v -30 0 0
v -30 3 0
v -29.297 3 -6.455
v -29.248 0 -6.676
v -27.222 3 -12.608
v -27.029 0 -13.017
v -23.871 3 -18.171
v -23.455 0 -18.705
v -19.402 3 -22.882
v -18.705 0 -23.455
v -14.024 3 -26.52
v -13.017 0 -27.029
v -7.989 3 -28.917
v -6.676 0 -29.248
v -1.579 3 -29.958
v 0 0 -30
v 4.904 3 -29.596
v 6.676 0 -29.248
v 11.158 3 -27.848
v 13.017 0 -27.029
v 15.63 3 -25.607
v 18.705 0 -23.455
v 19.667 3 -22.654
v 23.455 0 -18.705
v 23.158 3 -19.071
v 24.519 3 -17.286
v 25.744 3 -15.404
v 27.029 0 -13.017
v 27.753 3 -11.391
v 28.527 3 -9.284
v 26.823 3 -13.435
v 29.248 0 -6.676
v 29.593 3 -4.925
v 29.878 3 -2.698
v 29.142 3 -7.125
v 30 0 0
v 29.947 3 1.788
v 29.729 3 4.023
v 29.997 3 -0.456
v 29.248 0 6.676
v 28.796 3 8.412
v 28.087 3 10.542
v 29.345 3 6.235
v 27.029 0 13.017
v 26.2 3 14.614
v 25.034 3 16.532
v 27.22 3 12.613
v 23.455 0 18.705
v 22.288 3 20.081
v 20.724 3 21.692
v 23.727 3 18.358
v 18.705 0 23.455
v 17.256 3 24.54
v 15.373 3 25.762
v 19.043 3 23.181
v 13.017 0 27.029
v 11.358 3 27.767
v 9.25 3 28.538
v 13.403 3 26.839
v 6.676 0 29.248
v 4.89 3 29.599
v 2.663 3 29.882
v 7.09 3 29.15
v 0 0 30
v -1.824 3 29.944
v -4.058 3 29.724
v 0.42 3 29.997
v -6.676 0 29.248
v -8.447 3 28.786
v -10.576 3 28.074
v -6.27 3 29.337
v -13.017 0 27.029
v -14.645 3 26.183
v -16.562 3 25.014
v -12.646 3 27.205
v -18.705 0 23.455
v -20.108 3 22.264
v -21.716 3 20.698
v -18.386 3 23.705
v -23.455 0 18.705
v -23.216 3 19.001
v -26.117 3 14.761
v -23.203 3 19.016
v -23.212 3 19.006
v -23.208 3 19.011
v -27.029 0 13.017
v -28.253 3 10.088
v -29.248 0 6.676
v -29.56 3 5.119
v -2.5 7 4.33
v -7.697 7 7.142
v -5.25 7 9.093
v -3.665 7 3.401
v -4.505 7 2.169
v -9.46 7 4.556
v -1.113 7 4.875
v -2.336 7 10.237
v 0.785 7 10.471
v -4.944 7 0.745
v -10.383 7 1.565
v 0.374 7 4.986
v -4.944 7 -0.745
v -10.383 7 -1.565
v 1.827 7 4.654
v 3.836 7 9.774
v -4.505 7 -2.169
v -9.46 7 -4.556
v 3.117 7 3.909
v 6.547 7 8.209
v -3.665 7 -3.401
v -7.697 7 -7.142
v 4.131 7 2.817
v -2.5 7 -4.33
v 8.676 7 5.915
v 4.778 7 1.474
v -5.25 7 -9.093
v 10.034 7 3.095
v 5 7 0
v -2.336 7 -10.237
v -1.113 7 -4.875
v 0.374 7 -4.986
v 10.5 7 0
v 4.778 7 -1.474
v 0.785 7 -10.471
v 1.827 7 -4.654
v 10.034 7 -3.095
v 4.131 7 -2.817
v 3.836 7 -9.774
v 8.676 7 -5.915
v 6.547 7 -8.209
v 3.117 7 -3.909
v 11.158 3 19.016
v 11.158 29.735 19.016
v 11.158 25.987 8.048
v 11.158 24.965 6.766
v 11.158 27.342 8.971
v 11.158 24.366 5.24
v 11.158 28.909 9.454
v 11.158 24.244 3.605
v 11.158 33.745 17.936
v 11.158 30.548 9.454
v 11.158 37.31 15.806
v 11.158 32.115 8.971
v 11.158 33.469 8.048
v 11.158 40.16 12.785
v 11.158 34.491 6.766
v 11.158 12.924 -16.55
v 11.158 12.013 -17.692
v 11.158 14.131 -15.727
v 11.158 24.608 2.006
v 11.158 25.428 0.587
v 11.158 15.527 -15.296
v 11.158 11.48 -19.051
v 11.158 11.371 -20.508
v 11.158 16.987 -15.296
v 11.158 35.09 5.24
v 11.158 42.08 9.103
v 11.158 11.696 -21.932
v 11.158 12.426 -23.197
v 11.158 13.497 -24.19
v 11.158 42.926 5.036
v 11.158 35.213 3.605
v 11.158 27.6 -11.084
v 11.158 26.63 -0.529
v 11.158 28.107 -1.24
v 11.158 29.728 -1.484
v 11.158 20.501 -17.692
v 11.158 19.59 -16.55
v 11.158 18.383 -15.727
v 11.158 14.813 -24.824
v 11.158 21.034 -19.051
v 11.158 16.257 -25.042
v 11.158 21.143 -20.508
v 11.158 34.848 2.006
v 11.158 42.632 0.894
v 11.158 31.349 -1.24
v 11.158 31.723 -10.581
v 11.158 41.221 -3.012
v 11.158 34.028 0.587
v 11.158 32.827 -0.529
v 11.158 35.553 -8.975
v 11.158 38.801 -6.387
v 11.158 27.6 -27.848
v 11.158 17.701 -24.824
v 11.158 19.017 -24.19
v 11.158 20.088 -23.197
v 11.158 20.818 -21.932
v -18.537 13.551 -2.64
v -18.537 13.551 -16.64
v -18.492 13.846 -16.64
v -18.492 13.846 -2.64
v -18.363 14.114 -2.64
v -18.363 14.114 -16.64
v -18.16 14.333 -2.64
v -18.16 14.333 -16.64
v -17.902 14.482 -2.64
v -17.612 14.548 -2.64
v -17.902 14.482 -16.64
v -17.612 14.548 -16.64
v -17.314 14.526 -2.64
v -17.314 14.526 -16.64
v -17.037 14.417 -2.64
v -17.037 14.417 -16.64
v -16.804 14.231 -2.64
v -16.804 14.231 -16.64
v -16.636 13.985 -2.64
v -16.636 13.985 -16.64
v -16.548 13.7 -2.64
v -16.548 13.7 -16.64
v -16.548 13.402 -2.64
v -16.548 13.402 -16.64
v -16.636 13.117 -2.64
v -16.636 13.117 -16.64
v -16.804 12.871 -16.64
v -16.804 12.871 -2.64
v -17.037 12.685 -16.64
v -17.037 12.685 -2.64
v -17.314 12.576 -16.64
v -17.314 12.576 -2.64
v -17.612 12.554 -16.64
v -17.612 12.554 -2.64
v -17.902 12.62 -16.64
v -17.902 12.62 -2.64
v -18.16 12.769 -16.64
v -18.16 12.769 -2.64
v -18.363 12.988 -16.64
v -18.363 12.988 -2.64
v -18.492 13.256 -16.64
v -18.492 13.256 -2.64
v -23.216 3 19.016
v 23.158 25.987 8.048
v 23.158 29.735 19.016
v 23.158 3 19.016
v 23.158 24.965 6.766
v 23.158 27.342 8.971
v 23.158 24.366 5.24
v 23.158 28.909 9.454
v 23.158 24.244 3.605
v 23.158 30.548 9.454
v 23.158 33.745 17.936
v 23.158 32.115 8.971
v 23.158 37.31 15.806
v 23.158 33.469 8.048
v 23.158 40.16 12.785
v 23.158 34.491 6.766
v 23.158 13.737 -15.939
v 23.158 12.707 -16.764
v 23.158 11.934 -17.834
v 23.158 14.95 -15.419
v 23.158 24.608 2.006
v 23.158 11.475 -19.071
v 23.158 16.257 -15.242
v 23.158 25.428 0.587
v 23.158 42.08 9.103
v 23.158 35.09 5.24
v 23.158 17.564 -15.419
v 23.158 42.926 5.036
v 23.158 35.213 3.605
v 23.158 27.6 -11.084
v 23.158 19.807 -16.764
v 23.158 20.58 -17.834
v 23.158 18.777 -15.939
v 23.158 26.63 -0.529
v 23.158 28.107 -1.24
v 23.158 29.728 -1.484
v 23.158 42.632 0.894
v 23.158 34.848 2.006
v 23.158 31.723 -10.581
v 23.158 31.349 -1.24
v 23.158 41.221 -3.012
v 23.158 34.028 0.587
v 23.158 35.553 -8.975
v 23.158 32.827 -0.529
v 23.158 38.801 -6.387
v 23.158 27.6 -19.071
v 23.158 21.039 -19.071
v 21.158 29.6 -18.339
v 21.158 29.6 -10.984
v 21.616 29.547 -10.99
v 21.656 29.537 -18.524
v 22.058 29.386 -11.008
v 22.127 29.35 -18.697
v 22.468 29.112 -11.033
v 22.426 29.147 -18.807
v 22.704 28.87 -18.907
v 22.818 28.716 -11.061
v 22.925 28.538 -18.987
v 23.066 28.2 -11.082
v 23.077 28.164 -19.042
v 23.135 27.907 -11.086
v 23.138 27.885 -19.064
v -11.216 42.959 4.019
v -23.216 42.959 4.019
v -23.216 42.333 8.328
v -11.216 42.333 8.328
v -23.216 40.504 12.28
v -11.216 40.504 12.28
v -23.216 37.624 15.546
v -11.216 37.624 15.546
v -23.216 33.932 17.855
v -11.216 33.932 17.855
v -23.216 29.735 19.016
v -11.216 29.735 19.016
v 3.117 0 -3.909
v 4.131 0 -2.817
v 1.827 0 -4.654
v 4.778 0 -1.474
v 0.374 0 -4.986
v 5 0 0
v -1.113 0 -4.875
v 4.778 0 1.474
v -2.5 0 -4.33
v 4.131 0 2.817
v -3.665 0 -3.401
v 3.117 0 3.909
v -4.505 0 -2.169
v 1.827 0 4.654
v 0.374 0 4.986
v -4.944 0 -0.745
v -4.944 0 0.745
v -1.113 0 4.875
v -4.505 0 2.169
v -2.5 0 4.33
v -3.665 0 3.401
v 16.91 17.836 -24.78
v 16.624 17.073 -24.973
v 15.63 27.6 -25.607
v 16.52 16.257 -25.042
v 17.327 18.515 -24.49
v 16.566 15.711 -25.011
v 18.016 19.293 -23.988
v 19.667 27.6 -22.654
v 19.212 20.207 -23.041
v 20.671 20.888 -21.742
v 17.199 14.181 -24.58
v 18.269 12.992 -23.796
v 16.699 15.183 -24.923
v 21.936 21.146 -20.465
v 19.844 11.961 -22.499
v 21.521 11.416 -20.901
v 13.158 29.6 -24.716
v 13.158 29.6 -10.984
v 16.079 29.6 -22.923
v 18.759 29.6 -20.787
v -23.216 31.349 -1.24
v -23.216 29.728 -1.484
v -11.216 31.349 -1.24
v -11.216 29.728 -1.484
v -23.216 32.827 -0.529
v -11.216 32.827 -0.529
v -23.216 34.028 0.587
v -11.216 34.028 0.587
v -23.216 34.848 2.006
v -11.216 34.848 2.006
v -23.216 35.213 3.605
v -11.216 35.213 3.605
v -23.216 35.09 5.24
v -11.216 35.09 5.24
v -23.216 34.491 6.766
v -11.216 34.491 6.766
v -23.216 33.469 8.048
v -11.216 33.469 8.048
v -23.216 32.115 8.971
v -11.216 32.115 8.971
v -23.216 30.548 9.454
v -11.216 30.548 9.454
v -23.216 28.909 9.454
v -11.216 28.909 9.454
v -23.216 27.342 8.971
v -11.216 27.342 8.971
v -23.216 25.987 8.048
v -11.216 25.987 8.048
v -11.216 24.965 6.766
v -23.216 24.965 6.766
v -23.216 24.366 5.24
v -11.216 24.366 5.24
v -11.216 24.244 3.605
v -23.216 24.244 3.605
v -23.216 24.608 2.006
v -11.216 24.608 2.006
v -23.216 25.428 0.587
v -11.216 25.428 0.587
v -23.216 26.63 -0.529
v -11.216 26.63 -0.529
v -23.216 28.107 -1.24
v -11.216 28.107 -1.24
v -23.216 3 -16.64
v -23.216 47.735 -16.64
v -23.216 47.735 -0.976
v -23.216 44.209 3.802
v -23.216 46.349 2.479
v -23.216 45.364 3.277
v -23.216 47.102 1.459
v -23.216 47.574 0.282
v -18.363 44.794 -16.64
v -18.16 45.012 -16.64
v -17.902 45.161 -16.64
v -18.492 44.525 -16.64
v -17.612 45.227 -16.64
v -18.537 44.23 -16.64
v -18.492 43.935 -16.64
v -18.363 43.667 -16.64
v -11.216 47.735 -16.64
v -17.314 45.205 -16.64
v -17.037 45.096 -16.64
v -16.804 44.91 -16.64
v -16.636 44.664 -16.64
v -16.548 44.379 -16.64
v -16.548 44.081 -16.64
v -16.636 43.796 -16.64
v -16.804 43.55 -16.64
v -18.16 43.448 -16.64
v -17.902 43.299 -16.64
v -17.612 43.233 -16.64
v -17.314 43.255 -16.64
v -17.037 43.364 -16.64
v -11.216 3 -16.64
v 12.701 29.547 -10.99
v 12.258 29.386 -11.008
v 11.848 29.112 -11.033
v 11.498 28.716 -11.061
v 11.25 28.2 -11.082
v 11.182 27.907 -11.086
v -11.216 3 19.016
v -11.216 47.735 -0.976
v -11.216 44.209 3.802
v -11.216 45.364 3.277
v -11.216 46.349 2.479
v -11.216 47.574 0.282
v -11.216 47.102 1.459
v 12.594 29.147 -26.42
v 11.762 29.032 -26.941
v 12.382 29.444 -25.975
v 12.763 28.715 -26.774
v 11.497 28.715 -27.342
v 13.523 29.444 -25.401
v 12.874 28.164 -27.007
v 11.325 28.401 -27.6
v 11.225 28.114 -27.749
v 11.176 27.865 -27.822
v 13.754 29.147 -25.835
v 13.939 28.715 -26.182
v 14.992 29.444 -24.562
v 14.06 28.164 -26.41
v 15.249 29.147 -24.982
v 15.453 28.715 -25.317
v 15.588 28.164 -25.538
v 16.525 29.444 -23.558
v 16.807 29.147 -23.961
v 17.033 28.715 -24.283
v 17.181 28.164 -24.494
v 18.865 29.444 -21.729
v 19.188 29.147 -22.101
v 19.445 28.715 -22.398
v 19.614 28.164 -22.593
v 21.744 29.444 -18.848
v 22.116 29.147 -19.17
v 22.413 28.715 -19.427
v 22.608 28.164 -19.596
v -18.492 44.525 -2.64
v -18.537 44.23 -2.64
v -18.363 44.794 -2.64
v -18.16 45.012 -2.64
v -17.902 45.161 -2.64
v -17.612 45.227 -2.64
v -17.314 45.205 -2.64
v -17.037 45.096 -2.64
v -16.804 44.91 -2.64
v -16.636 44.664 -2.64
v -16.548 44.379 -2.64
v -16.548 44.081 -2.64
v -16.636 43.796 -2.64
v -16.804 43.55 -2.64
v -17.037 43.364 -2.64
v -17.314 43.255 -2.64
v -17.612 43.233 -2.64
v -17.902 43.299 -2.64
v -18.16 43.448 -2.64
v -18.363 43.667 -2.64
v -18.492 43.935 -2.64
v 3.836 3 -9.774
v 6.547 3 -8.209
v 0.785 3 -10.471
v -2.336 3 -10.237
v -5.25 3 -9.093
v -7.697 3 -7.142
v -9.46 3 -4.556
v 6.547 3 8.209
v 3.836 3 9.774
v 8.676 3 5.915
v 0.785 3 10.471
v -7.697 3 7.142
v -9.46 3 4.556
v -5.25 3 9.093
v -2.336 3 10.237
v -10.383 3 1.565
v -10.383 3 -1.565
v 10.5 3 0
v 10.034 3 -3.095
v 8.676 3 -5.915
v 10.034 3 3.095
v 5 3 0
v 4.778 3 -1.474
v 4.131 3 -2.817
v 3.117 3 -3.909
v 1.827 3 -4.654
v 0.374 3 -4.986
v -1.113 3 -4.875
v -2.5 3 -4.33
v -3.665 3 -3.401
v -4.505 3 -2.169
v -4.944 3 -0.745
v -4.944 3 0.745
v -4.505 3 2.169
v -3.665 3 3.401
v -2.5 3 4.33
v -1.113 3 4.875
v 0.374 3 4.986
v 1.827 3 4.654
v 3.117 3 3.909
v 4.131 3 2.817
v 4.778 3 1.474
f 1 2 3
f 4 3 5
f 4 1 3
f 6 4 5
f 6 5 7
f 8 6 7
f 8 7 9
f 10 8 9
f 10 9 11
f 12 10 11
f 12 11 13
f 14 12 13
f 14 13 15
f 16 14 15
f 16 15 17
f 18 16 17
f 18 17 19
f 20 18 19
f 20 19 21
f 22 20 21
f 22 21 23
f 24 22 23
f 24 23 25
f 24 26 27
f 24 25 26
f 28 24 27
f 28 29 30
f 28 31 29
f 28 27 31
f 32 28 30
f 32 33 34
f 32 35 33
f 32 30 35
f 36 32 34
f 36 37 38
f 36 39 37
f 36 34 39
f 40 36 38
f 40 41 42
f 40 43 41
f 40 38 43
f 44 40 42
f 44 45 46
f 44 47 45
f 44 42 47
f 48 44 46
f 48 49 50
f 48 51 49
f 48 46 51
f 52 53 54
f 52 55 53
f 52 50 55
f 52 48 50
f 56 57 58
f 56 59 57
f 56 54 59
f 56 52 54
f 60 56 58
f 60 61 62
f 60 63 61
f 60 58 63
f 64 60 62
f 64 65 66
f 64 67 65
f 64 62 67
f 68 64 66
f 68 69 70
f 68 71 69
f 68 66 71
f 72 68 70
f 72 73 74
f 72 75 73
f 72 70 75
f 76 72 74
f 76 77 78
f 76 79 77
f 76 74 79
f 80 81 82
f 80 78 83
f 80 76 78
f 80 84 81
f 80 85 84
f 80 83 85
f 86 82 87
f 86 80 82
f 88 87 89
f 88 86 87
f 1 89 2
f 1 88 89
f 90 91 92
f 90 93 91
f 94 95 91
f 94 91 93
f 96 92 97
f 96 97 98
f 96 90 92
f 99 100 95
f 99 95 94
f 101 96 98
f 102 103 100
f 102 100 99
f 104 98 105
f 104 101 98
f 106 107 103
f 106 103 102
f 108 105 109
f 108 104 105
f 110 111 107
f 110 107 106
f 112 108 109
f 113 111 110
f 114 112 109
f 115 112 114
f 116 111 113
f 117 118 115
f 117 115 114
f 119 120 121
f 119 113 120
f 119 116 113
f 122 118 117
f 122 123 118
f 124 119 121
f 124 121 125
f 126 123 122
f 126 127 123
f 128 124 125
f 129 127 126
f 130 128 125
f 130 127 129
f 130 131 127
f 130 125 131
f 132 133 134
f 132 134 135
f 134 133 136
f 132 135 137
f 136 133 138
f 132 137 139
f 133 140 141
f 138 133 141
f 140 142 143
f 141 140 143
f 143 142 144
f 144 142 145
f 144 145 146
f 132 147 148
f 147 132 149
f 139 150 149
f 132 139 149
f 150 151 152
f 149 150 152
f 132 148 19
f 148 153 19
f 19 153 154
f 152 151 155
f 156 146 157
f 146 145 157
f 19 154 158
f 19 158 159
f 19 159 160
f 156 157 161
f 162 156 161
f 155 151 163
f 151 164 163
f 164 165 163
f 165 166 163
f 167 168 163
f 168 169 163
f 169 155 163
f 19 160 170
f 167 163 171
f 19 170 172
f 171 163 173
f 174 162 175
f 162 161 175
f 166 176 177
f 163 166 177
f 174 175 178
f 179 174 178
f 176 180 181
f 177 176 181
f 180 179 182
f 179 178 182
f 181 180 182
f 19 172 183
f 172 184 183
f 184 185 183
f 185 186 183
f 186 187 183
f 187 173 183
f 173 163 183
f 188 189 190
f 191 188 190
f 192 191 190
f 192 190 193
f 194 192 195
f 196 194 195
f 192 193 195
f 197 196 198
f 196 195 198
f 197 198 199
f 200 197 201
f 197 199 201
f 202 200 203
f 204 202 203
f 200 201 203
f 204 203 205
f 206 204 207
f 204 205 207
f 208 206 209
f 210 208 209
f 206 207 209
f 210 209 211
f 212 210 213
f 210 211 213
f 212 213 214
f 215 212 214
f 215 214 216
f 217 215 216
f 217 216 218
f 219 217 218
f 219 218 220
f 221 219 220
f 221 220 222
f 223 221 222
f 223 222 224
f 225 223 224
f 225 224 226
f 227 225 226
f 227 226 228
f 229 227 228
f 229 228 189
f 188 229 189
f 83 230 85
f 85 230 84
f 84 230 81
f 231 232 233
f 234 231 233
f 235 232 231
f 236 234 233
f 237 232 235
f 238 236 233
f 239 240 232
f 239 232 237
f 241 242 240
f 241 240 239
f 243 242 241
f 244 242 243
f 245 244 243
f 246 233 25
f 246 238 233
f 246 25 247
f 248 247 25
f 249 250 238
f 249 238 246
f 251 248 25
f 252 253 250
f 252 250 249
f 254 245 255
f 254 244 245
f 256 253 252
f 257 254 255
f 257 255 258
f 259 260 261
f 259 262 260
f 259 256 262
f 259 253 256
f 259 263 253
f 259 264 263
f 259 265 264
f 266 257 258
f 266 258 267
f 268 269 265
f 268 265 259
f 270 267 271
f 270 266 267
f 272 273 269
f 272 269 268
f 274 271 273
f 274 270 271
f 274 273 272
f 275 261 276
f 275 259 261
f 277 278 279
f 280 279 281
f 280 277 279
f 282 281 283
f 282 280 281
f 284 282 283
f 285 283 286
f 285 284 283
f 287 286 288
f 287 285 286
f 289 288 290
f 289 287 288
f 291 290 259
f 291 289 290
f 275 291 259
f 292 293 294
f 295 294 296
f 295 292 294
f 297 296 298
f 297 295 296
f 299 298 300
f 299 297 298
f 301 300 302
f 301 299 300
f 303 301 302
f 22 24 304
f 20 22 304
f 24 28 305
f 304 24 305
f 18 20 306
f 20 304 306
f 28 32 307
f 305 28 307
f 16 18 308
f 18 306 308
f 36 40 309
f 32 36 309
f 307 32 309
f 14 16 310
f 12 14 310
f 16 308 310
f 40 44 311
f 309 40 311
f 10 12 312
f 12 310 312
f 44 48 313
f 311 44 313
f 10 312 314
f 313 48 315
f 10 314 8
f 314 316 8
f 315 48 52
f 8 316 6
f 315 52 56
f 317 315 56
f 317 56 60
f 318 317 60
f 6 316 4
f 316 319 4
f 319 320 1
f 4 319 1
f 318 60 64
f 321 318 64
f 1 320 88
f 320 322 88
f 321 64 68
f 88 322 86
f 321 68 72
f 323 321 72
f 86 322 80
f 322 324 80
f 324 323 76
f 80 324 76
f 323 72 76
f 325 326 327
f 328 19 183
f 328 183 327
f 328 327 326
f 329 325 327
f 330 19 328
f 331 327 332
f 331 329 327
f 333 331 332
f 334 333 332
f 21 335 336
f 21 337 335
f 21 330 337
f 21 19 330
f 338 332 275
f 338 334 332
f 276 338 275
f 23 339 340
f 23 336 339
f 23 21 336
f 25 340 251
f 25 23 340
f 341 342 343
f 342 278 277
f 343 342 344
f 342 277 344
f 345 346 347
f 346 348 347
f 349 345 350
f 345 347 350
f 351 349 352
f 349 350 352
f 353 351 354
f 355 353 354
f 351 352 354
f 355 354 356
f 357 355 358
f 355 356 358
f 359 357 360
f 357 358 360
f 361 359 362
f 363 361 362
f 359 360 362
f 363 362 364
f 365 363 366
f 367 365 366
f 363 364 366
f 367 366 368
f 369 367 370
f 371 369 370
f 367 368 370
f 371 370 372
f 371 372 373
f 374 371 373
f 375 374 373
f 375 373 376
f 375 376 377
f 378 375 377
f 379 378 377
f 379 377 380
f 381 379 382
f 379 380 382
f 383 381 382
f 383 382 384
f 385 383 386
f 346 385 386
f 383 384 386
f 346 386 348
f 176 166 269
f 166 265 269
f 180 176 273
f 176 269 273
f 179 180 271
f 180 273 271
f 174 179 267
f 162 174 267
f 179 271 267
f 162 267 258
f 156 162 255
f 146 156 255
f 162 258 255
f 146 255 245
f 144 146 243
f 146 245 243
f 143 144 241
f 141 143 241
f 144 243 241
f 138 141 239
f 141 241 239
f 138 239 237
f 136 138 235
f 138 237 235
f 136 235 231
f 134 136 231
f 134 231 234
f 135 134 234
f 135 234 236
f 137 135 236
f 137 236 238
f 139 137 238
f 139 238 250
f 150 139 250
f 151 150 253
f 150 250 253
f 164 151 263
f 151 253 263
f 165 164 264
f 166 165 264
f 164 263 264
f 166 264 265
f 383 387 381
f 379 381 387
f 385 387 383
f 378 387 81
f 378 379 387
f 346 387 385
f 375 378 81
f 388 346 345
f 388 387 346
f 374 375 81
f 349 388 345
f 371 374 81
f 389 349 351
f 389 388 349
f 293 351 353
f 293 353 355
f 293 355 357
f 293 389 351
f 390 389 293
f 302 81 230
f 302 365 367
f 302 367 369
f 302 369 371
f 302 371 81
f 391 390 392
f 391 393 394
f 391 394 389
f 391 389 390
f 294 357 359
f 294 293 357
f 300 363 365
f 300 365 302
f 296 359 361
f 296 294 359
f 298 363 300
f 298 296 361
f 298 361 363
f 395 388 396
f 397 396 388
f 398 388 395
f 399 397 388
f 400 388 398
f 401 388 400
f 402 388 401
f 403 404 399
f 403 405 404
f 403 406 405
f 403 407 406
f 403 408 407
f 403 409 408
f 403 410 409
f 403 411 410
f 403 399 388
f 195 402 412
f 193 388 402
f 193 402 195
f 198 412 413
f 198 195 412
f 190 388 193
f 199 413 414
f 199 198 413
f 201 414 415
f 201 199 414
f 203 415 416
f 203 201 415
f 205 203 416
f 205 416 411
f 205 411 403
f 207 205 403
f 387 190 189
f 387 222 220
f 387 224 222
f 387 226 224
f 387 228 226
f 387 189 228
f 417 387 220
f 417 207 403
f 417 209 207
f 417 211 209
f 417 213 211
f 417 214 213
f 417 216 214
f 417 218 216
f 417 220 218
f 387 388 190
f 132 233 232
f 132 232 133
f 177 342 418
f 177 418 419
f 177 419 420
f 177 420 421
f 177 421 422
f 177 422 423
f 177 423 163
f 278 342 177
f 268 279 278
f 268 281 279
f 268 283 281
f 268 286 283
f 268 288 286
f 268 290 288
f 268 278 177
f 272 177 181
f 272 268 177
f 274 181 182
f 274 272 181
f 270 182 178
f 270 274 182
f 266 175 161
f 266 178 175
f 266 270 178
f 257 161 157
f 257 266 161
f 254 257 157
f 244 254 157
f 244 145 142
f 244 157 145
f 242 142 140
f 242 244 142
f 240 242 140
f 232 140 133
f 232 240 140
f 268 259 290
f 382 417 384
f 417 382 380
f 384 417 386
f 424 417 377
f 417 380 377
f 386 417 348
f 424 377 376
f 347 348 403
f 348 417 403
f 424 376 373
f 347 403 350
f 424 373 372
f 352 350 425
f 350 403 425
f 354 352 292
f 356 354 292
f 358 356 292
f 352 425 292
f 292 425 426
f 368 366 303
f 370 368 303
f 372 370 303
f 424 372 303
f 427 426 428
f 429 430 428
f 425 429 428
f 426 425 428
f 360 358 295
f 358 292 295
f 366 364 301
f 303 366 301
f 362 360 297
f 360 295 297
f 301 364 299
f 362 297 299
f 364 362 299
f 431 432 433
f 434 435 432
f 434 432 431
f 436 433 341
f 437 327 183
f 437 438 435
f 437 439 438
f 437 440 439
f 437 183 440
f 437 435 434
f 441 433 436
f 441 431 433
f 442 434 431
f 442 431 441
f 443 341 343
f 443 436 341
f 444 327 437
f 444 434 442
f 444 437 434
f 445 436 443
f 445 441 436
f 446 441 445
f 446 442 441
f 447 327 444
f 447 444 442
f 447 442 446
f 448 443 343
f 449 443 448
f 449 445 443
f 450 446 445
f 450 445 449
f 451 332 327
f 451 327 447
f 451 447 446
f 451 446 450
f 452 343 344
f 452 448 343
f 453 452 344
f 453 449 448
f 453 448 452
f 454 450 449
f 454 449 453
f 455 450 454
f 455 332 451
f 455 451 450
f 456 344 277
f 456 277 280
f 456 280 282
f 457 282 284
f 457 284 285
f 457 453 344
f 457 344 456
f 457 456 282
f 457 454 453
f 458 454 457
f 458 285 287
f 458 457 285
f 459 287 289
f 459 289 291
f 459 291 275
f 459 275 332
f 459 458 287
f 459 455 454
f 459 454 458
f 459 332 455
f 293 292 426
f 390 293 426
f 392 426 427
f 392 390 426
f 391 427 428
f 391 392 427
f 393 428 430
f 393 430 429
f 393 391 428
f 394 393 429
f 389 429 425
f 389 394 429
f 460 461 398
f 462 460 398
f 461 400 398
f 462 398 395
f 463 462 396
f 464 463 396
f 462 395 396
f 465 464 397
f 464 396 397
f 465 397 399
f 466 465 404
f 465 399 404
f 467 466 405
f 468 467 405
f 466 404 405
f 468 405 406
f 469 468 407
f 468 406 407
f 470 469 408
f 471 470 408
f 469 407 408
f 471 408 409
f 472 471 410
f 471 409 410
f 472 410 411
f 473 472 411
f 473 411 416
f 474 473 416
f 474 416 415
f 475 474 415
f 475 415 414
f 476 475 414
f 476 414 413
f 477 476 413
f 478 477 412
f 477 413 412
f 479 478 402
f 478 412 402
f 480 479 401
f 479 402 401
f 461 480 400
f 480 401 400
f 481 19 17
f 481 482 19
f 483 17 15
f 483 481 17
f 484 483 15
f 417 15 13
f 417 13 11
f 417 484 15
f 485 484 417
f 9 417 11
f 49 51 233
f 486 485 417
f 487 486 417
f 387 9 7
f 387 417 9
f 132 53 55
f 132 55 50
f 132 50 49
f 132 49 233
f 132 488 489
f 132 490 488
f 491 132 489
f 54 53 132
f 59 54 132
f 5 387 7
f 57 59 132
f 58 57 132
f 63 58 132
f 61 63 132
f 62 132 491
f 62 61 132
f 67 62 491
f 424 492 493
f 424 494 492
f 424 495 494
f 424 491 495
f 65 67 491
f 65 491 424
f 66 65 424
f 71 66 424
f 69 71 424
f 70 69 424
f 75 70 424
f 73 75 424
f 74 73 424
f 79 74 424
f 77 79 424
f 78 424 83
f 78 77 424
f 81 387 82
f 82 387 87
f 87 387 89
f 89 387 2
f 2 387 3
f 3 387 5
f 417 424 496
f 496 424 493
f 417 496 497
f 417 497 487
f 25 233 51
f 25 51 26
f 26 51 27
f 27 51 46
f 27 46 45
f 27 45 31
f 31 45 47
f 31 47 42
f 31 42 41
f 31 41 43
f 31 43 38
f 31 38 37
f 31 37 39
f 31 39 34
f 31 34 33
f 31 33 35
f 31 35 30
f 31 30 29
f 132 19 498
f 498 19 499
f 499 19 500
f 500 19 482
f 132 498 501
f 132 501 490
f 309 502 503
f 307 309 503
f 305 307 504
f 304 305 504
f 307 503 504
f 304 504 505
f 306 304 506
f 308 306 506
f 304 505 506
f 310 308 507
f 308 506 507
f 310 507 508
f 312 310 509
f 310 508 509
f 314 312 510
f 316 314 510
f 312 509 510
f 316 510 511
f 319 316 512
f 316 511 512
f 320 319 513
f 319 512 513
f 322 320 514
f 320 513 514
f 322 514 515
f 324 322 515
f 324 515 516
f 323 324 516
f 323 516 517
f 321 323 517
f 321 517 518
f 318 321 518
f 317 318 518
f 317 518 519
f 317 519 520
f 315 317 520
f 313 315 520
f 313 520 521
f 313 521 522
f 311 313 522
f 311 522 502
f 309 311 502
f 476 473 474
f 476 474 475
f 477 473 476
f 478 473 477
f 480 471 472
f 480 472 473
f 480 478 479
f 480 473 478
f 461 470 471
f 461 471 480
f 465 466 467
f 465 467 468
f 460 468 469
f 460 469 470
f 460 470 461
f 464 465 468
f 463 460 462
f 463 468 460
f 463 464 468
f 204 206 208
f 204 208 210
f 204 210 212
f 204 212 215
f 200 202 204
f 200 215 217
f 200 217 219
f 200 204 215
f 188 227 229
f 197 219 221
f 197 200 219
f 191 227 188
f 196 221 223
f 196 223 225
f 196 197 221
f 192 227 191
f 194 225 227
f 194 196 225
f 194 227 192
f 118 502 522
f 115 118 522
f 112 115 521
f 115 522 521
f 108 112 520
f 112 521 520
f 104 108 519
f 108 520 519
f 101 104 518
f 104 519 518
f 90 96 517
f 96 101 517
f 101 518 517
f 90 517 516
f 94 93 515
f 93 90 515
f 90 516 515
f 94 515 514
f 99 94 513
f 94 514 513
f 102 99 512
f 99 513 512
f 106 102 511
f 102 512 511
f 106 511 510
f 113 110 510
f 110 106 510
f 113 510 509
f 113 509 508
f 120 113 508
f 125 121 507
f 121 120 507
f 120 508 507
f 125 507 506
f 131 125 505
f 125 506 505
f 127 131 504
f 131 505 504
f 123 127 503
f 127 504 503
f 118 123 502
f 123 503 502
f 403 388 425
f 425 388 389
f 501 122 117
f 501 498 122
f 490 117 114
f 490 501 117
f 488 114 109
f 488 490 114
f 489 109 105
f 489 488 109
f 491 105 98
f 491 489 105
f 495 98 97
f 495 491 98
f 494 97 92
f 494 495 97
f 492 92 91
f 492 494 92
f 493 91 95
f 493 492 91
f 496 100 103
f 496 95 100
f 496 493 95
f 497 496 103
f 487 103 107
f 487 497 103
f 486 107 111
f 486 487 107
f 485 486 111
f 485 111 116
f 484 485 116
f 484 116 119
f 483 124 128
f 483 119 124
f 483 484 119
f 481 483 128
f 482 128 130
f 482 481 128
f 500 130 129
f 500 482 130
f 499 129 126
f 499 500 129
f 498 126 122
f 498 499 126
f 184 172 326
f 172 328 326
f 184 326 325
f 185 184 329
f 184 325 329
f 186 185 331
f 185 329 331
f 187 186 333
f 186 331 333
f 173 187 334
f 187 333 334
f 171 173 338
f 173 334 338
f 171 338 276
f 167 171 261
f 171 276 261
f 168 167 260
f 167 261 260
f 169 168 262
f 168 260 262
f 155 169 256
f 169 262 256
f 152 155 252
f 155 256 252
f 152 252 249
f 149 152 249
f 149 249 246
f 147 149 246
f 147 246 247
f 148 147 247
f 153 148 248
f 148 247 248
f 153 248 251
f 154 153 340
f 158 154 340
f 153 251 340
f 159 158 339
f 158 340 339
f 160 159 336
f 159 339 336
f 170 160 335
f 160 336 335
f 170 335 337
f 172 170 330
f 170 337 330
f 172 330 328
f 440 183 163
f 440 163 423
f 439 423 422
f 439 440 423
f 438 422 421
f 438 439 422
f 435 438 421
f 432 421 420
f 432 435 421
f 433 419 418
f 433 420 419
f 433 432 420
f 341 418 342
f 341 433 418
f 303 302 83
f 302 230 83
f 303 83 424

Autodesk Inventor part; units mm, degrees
ref_plane "YZ Plane" through (0, 0, 0) normal (1, 0, 0) x (0, 1, 0)
ref_plane "XZ Plane" through (0, 0, 0) normal (0, 1, 0) x (-1, 0, 0)
ref_plane "XY Plane" through (0, 0, 0) normal (0, 0, 1) x (1, 0, 0)
sketch "Sketch1" plane through (0, 0, 0) normal (0, 1, 0) x (-1, 0, 0)
  circle A0 centre (0, 0) radius 30
  dimension "d0" = 60
extrude "Extrusion1" add sketch "Sketch1" along normal blind 3
sketch "Sketch2" plane through (0, 3, 0) normal (0, 1, 0) x (1, 0, 0)
  circle A0 centre (0, 0) radius 5
  dimension "d3" = 10
extrude "Extrusion2" cut sketch "Sketch2" against normal blind 4
sketch "Sketch4" plane through (0, 3, 0) normal (0, 1, 0) x (1, 0, 0)
  line L0 (-23.2158, -19.0158) -> (-11.2158, -19.0158)
  line L1 (-11.2158, -19.0158) -> (-11.2158, 10.9842)
  line L2 (-11.2158, 10.9842) -> (-23.2158, 10.9842)
  line L3 (-23.2158, 10.9842) -> (-23.2158, -19.0158)
  line L4 (-0.0289, -32.9889) -> (-0.0289, 43.4959) construction
  line L5 (23.1581, -19.0158) -> (11.1581, -19.0158)
  line L6 (11.1581, -19.0158) -> (11.1581, 10.9842)
  line L7 (11.1581, 10.9842) -> (23.1581, 10.9842)
  line L8 (23.1581, 10.9842) -> (23.1581, -19.0158)
  point P0 (0, -4.0158)
  point P1 (-23.2158, -4.0158)
  point P2 (23.2158, 0)
  dimension "d9" = 12
  dimension "d10" = 30
extrude "Extrusion4" add sketch "Sketch4" along normal blind 40
sketch "Sketch5" plane through (23.1581, 3, 19.0158) normal (1, 0, 0) x (0, 0, -1)
  line L0 (30, 0) -> (30, 40) projected
  line L1 (0, 0) -> (0, 40) projected
  arc A0 (30, 26.6004) -> (0, 26.7351) centre (14.9918, 24.8495) ccw
  line L2 (0, 26.7351) -> (0, 40)
  line L3 (30, 40) -> (0, 40) projected
  line L4 (30, 40) -> (30, 26.6004)
  point P0 (19.0158, -3)
extrude "Extrusion5" cut sketch "Sketch5" against normal blind 74.5
sketch "Sketch6" plane through (23.1581, 3, 19.0158) normal (1, 0, 0) x (0, 0, -1)
  circle A0 centre (15, 26.7283) radius 5.5
  point P0 (19.0158, -3)
  dimension "d15" = 11
extrude "Extrusion6" cut sketch "Sketch6" against normal blind 74.5
sketch "Sketch7" plane through (23.1581, 3, 19.0158) normal (1, 0, 0) x (0, 0, -1)
  line L0 (30, 0) -> (30, 26.6004) projected
  line L1 (30, 26.6004) -> (49.0158, 26.6004)
  line L2 (49.0158, 0) -> (-10.9842, 0) projected
  line L3 (49.0158, 26.6004) -> (49.0158, 0)
  point P0 (19.0158, -3)
  point P1 (0, 0)
  point P2 (0.0152, 0)
extrude "Extrusion7" add sketch "Sketch7" against normal blind 12
sketch "Sketch8" plane through (23.1581, 3, 19.0158) normal (1, 0, 0) x (0, 0, -1)
  circle A0 centre (39.1574, 13.257) radius 4.9
  point P0 (19.0158, -3)
  dimension "d20" = 9.8
extrude "Extrusion8" cut sketch "Sketch8" against normal blind 12
sketch "Sketch9" plane through (23.1581, 3, -30) normal (0, -1, 0) x (1, 0, 0)
  line L0 (-12, 0) -> (-12, 2.1522) projected
  arc A0 (-12, 2.1522) -> (0, 10.929) centre (-23.1581, 30) ccw projected
  arc A1 (-12, 2.1522) -> (0, 10.929) centre (-23.1408, 29.9763) ccw
  line L1 (0, 10.929) -> (0, 0) projected
  line L2 (0, 10.929) -> (0, 0)
  line L3 (0, 0) -> (-12, 0)
extrude "Extrusion9" cut sketch "Sketch9" against normal blind 33.25
fillet "Fillet1" radius 2 3 edges at (23.1581, 29.6004, -15.0276) (17.7109, 29.6004, -24.2152) (11.1581, 29.6004, -19.416)
sketch "Sketch10" plane through (-11.2158, 3, -10.9842) normal (0, 0, -1) x (-1, 0, 0)
  line L0 (0, 0) -> (0, 26.7351) projected
  line L1 (12, 0) -> (12, 26.7351) projected
  line L2 (0, 26.7351) -> (12, 26.7351)
  line L3 (12, 26.7351) -> (12, 0)
  line L4 (12, 0) -> (0, 0)
  line L5 (0, 0) -> (0, 26.7351)
  point P0 (-11.2158, -3)
extrude "Extrusion10" add sketch "Sketch10" along normal blind 5.656
sketch "Sketch11" plane through (-23.2158, 29.7351, -10.9842) normal (0, 1, 0) x (1, 0, 0)
  line L0 (12, -30) -> (12, 0) projected
  line L1 (0, -29.9848) -> (0, 5.656) projected
  line L2 (12, 0) -> (0, 0)
  line L3 (0, 0) -> (0, 5.656)
  line L4 (0, 5.656) -> (12, 5.656)
  line L5 (12, 5.656) -> (12, 0)
  point P0 (23.2158, -10.9842)
  point P1 (0, 0)
extrude "Extrusion11" add sketch "Sketch11" along normal blind 18
sketch "Sketch12" plane through (-23.2158, 3, 19.0158) normal (-1, 0, 0) x (0, 0, 1)
  line L0 (-30, 44.7351) -> (-30, 26.6004) projected
  line L1 (-30, 44.7351) -> (-14.9918, 44.7351)
  line L2 (-14.9918, 44.7351) -> (-14.9918, 39.9594)
  arc A0 (0, 26.7351) -> (-30.0997, 24.6004) centre (-14.9918, 24.8495) ccw projected
  point P0 (-19.0158, -3)
extrude "Extrusion12" add sketch "Sketch12" against normal blind 12
fillet "Fillet2" radius 5 1 edges at (-17.2158, 47.7351, 4.024)
sketch "Sketch13" plane through (-11.2158, 3, -16.6402) normal (0, 0, -1) x (-1, 0, 0)
  circle A0 centre (6.3211, 10.551) radius 1
  circle A1 centre (6.3211, 41.2302) radius 1
  point P0 (-11.2158, -3)
  dimension "d33" = 2
  dimension "d34" = 2
extrude "Extrusion13" cut sketch "Sketch13" against normal blind 14
sketch "Sketch15" plane through (0, 3, 0) normal (0, 1, 0) x (1, 0, 0)
  circle A0 centre (0, 0) radius 5 projected
  circle A1 centre (0, 0) radius 10.5
  circle A2 centre (0, 0) radius 5
  dimension "d39" = 21
extrude "Extrusion15" add sketch "Sketch15" along normal blind 4
properties part number "base2_3DPrint"
